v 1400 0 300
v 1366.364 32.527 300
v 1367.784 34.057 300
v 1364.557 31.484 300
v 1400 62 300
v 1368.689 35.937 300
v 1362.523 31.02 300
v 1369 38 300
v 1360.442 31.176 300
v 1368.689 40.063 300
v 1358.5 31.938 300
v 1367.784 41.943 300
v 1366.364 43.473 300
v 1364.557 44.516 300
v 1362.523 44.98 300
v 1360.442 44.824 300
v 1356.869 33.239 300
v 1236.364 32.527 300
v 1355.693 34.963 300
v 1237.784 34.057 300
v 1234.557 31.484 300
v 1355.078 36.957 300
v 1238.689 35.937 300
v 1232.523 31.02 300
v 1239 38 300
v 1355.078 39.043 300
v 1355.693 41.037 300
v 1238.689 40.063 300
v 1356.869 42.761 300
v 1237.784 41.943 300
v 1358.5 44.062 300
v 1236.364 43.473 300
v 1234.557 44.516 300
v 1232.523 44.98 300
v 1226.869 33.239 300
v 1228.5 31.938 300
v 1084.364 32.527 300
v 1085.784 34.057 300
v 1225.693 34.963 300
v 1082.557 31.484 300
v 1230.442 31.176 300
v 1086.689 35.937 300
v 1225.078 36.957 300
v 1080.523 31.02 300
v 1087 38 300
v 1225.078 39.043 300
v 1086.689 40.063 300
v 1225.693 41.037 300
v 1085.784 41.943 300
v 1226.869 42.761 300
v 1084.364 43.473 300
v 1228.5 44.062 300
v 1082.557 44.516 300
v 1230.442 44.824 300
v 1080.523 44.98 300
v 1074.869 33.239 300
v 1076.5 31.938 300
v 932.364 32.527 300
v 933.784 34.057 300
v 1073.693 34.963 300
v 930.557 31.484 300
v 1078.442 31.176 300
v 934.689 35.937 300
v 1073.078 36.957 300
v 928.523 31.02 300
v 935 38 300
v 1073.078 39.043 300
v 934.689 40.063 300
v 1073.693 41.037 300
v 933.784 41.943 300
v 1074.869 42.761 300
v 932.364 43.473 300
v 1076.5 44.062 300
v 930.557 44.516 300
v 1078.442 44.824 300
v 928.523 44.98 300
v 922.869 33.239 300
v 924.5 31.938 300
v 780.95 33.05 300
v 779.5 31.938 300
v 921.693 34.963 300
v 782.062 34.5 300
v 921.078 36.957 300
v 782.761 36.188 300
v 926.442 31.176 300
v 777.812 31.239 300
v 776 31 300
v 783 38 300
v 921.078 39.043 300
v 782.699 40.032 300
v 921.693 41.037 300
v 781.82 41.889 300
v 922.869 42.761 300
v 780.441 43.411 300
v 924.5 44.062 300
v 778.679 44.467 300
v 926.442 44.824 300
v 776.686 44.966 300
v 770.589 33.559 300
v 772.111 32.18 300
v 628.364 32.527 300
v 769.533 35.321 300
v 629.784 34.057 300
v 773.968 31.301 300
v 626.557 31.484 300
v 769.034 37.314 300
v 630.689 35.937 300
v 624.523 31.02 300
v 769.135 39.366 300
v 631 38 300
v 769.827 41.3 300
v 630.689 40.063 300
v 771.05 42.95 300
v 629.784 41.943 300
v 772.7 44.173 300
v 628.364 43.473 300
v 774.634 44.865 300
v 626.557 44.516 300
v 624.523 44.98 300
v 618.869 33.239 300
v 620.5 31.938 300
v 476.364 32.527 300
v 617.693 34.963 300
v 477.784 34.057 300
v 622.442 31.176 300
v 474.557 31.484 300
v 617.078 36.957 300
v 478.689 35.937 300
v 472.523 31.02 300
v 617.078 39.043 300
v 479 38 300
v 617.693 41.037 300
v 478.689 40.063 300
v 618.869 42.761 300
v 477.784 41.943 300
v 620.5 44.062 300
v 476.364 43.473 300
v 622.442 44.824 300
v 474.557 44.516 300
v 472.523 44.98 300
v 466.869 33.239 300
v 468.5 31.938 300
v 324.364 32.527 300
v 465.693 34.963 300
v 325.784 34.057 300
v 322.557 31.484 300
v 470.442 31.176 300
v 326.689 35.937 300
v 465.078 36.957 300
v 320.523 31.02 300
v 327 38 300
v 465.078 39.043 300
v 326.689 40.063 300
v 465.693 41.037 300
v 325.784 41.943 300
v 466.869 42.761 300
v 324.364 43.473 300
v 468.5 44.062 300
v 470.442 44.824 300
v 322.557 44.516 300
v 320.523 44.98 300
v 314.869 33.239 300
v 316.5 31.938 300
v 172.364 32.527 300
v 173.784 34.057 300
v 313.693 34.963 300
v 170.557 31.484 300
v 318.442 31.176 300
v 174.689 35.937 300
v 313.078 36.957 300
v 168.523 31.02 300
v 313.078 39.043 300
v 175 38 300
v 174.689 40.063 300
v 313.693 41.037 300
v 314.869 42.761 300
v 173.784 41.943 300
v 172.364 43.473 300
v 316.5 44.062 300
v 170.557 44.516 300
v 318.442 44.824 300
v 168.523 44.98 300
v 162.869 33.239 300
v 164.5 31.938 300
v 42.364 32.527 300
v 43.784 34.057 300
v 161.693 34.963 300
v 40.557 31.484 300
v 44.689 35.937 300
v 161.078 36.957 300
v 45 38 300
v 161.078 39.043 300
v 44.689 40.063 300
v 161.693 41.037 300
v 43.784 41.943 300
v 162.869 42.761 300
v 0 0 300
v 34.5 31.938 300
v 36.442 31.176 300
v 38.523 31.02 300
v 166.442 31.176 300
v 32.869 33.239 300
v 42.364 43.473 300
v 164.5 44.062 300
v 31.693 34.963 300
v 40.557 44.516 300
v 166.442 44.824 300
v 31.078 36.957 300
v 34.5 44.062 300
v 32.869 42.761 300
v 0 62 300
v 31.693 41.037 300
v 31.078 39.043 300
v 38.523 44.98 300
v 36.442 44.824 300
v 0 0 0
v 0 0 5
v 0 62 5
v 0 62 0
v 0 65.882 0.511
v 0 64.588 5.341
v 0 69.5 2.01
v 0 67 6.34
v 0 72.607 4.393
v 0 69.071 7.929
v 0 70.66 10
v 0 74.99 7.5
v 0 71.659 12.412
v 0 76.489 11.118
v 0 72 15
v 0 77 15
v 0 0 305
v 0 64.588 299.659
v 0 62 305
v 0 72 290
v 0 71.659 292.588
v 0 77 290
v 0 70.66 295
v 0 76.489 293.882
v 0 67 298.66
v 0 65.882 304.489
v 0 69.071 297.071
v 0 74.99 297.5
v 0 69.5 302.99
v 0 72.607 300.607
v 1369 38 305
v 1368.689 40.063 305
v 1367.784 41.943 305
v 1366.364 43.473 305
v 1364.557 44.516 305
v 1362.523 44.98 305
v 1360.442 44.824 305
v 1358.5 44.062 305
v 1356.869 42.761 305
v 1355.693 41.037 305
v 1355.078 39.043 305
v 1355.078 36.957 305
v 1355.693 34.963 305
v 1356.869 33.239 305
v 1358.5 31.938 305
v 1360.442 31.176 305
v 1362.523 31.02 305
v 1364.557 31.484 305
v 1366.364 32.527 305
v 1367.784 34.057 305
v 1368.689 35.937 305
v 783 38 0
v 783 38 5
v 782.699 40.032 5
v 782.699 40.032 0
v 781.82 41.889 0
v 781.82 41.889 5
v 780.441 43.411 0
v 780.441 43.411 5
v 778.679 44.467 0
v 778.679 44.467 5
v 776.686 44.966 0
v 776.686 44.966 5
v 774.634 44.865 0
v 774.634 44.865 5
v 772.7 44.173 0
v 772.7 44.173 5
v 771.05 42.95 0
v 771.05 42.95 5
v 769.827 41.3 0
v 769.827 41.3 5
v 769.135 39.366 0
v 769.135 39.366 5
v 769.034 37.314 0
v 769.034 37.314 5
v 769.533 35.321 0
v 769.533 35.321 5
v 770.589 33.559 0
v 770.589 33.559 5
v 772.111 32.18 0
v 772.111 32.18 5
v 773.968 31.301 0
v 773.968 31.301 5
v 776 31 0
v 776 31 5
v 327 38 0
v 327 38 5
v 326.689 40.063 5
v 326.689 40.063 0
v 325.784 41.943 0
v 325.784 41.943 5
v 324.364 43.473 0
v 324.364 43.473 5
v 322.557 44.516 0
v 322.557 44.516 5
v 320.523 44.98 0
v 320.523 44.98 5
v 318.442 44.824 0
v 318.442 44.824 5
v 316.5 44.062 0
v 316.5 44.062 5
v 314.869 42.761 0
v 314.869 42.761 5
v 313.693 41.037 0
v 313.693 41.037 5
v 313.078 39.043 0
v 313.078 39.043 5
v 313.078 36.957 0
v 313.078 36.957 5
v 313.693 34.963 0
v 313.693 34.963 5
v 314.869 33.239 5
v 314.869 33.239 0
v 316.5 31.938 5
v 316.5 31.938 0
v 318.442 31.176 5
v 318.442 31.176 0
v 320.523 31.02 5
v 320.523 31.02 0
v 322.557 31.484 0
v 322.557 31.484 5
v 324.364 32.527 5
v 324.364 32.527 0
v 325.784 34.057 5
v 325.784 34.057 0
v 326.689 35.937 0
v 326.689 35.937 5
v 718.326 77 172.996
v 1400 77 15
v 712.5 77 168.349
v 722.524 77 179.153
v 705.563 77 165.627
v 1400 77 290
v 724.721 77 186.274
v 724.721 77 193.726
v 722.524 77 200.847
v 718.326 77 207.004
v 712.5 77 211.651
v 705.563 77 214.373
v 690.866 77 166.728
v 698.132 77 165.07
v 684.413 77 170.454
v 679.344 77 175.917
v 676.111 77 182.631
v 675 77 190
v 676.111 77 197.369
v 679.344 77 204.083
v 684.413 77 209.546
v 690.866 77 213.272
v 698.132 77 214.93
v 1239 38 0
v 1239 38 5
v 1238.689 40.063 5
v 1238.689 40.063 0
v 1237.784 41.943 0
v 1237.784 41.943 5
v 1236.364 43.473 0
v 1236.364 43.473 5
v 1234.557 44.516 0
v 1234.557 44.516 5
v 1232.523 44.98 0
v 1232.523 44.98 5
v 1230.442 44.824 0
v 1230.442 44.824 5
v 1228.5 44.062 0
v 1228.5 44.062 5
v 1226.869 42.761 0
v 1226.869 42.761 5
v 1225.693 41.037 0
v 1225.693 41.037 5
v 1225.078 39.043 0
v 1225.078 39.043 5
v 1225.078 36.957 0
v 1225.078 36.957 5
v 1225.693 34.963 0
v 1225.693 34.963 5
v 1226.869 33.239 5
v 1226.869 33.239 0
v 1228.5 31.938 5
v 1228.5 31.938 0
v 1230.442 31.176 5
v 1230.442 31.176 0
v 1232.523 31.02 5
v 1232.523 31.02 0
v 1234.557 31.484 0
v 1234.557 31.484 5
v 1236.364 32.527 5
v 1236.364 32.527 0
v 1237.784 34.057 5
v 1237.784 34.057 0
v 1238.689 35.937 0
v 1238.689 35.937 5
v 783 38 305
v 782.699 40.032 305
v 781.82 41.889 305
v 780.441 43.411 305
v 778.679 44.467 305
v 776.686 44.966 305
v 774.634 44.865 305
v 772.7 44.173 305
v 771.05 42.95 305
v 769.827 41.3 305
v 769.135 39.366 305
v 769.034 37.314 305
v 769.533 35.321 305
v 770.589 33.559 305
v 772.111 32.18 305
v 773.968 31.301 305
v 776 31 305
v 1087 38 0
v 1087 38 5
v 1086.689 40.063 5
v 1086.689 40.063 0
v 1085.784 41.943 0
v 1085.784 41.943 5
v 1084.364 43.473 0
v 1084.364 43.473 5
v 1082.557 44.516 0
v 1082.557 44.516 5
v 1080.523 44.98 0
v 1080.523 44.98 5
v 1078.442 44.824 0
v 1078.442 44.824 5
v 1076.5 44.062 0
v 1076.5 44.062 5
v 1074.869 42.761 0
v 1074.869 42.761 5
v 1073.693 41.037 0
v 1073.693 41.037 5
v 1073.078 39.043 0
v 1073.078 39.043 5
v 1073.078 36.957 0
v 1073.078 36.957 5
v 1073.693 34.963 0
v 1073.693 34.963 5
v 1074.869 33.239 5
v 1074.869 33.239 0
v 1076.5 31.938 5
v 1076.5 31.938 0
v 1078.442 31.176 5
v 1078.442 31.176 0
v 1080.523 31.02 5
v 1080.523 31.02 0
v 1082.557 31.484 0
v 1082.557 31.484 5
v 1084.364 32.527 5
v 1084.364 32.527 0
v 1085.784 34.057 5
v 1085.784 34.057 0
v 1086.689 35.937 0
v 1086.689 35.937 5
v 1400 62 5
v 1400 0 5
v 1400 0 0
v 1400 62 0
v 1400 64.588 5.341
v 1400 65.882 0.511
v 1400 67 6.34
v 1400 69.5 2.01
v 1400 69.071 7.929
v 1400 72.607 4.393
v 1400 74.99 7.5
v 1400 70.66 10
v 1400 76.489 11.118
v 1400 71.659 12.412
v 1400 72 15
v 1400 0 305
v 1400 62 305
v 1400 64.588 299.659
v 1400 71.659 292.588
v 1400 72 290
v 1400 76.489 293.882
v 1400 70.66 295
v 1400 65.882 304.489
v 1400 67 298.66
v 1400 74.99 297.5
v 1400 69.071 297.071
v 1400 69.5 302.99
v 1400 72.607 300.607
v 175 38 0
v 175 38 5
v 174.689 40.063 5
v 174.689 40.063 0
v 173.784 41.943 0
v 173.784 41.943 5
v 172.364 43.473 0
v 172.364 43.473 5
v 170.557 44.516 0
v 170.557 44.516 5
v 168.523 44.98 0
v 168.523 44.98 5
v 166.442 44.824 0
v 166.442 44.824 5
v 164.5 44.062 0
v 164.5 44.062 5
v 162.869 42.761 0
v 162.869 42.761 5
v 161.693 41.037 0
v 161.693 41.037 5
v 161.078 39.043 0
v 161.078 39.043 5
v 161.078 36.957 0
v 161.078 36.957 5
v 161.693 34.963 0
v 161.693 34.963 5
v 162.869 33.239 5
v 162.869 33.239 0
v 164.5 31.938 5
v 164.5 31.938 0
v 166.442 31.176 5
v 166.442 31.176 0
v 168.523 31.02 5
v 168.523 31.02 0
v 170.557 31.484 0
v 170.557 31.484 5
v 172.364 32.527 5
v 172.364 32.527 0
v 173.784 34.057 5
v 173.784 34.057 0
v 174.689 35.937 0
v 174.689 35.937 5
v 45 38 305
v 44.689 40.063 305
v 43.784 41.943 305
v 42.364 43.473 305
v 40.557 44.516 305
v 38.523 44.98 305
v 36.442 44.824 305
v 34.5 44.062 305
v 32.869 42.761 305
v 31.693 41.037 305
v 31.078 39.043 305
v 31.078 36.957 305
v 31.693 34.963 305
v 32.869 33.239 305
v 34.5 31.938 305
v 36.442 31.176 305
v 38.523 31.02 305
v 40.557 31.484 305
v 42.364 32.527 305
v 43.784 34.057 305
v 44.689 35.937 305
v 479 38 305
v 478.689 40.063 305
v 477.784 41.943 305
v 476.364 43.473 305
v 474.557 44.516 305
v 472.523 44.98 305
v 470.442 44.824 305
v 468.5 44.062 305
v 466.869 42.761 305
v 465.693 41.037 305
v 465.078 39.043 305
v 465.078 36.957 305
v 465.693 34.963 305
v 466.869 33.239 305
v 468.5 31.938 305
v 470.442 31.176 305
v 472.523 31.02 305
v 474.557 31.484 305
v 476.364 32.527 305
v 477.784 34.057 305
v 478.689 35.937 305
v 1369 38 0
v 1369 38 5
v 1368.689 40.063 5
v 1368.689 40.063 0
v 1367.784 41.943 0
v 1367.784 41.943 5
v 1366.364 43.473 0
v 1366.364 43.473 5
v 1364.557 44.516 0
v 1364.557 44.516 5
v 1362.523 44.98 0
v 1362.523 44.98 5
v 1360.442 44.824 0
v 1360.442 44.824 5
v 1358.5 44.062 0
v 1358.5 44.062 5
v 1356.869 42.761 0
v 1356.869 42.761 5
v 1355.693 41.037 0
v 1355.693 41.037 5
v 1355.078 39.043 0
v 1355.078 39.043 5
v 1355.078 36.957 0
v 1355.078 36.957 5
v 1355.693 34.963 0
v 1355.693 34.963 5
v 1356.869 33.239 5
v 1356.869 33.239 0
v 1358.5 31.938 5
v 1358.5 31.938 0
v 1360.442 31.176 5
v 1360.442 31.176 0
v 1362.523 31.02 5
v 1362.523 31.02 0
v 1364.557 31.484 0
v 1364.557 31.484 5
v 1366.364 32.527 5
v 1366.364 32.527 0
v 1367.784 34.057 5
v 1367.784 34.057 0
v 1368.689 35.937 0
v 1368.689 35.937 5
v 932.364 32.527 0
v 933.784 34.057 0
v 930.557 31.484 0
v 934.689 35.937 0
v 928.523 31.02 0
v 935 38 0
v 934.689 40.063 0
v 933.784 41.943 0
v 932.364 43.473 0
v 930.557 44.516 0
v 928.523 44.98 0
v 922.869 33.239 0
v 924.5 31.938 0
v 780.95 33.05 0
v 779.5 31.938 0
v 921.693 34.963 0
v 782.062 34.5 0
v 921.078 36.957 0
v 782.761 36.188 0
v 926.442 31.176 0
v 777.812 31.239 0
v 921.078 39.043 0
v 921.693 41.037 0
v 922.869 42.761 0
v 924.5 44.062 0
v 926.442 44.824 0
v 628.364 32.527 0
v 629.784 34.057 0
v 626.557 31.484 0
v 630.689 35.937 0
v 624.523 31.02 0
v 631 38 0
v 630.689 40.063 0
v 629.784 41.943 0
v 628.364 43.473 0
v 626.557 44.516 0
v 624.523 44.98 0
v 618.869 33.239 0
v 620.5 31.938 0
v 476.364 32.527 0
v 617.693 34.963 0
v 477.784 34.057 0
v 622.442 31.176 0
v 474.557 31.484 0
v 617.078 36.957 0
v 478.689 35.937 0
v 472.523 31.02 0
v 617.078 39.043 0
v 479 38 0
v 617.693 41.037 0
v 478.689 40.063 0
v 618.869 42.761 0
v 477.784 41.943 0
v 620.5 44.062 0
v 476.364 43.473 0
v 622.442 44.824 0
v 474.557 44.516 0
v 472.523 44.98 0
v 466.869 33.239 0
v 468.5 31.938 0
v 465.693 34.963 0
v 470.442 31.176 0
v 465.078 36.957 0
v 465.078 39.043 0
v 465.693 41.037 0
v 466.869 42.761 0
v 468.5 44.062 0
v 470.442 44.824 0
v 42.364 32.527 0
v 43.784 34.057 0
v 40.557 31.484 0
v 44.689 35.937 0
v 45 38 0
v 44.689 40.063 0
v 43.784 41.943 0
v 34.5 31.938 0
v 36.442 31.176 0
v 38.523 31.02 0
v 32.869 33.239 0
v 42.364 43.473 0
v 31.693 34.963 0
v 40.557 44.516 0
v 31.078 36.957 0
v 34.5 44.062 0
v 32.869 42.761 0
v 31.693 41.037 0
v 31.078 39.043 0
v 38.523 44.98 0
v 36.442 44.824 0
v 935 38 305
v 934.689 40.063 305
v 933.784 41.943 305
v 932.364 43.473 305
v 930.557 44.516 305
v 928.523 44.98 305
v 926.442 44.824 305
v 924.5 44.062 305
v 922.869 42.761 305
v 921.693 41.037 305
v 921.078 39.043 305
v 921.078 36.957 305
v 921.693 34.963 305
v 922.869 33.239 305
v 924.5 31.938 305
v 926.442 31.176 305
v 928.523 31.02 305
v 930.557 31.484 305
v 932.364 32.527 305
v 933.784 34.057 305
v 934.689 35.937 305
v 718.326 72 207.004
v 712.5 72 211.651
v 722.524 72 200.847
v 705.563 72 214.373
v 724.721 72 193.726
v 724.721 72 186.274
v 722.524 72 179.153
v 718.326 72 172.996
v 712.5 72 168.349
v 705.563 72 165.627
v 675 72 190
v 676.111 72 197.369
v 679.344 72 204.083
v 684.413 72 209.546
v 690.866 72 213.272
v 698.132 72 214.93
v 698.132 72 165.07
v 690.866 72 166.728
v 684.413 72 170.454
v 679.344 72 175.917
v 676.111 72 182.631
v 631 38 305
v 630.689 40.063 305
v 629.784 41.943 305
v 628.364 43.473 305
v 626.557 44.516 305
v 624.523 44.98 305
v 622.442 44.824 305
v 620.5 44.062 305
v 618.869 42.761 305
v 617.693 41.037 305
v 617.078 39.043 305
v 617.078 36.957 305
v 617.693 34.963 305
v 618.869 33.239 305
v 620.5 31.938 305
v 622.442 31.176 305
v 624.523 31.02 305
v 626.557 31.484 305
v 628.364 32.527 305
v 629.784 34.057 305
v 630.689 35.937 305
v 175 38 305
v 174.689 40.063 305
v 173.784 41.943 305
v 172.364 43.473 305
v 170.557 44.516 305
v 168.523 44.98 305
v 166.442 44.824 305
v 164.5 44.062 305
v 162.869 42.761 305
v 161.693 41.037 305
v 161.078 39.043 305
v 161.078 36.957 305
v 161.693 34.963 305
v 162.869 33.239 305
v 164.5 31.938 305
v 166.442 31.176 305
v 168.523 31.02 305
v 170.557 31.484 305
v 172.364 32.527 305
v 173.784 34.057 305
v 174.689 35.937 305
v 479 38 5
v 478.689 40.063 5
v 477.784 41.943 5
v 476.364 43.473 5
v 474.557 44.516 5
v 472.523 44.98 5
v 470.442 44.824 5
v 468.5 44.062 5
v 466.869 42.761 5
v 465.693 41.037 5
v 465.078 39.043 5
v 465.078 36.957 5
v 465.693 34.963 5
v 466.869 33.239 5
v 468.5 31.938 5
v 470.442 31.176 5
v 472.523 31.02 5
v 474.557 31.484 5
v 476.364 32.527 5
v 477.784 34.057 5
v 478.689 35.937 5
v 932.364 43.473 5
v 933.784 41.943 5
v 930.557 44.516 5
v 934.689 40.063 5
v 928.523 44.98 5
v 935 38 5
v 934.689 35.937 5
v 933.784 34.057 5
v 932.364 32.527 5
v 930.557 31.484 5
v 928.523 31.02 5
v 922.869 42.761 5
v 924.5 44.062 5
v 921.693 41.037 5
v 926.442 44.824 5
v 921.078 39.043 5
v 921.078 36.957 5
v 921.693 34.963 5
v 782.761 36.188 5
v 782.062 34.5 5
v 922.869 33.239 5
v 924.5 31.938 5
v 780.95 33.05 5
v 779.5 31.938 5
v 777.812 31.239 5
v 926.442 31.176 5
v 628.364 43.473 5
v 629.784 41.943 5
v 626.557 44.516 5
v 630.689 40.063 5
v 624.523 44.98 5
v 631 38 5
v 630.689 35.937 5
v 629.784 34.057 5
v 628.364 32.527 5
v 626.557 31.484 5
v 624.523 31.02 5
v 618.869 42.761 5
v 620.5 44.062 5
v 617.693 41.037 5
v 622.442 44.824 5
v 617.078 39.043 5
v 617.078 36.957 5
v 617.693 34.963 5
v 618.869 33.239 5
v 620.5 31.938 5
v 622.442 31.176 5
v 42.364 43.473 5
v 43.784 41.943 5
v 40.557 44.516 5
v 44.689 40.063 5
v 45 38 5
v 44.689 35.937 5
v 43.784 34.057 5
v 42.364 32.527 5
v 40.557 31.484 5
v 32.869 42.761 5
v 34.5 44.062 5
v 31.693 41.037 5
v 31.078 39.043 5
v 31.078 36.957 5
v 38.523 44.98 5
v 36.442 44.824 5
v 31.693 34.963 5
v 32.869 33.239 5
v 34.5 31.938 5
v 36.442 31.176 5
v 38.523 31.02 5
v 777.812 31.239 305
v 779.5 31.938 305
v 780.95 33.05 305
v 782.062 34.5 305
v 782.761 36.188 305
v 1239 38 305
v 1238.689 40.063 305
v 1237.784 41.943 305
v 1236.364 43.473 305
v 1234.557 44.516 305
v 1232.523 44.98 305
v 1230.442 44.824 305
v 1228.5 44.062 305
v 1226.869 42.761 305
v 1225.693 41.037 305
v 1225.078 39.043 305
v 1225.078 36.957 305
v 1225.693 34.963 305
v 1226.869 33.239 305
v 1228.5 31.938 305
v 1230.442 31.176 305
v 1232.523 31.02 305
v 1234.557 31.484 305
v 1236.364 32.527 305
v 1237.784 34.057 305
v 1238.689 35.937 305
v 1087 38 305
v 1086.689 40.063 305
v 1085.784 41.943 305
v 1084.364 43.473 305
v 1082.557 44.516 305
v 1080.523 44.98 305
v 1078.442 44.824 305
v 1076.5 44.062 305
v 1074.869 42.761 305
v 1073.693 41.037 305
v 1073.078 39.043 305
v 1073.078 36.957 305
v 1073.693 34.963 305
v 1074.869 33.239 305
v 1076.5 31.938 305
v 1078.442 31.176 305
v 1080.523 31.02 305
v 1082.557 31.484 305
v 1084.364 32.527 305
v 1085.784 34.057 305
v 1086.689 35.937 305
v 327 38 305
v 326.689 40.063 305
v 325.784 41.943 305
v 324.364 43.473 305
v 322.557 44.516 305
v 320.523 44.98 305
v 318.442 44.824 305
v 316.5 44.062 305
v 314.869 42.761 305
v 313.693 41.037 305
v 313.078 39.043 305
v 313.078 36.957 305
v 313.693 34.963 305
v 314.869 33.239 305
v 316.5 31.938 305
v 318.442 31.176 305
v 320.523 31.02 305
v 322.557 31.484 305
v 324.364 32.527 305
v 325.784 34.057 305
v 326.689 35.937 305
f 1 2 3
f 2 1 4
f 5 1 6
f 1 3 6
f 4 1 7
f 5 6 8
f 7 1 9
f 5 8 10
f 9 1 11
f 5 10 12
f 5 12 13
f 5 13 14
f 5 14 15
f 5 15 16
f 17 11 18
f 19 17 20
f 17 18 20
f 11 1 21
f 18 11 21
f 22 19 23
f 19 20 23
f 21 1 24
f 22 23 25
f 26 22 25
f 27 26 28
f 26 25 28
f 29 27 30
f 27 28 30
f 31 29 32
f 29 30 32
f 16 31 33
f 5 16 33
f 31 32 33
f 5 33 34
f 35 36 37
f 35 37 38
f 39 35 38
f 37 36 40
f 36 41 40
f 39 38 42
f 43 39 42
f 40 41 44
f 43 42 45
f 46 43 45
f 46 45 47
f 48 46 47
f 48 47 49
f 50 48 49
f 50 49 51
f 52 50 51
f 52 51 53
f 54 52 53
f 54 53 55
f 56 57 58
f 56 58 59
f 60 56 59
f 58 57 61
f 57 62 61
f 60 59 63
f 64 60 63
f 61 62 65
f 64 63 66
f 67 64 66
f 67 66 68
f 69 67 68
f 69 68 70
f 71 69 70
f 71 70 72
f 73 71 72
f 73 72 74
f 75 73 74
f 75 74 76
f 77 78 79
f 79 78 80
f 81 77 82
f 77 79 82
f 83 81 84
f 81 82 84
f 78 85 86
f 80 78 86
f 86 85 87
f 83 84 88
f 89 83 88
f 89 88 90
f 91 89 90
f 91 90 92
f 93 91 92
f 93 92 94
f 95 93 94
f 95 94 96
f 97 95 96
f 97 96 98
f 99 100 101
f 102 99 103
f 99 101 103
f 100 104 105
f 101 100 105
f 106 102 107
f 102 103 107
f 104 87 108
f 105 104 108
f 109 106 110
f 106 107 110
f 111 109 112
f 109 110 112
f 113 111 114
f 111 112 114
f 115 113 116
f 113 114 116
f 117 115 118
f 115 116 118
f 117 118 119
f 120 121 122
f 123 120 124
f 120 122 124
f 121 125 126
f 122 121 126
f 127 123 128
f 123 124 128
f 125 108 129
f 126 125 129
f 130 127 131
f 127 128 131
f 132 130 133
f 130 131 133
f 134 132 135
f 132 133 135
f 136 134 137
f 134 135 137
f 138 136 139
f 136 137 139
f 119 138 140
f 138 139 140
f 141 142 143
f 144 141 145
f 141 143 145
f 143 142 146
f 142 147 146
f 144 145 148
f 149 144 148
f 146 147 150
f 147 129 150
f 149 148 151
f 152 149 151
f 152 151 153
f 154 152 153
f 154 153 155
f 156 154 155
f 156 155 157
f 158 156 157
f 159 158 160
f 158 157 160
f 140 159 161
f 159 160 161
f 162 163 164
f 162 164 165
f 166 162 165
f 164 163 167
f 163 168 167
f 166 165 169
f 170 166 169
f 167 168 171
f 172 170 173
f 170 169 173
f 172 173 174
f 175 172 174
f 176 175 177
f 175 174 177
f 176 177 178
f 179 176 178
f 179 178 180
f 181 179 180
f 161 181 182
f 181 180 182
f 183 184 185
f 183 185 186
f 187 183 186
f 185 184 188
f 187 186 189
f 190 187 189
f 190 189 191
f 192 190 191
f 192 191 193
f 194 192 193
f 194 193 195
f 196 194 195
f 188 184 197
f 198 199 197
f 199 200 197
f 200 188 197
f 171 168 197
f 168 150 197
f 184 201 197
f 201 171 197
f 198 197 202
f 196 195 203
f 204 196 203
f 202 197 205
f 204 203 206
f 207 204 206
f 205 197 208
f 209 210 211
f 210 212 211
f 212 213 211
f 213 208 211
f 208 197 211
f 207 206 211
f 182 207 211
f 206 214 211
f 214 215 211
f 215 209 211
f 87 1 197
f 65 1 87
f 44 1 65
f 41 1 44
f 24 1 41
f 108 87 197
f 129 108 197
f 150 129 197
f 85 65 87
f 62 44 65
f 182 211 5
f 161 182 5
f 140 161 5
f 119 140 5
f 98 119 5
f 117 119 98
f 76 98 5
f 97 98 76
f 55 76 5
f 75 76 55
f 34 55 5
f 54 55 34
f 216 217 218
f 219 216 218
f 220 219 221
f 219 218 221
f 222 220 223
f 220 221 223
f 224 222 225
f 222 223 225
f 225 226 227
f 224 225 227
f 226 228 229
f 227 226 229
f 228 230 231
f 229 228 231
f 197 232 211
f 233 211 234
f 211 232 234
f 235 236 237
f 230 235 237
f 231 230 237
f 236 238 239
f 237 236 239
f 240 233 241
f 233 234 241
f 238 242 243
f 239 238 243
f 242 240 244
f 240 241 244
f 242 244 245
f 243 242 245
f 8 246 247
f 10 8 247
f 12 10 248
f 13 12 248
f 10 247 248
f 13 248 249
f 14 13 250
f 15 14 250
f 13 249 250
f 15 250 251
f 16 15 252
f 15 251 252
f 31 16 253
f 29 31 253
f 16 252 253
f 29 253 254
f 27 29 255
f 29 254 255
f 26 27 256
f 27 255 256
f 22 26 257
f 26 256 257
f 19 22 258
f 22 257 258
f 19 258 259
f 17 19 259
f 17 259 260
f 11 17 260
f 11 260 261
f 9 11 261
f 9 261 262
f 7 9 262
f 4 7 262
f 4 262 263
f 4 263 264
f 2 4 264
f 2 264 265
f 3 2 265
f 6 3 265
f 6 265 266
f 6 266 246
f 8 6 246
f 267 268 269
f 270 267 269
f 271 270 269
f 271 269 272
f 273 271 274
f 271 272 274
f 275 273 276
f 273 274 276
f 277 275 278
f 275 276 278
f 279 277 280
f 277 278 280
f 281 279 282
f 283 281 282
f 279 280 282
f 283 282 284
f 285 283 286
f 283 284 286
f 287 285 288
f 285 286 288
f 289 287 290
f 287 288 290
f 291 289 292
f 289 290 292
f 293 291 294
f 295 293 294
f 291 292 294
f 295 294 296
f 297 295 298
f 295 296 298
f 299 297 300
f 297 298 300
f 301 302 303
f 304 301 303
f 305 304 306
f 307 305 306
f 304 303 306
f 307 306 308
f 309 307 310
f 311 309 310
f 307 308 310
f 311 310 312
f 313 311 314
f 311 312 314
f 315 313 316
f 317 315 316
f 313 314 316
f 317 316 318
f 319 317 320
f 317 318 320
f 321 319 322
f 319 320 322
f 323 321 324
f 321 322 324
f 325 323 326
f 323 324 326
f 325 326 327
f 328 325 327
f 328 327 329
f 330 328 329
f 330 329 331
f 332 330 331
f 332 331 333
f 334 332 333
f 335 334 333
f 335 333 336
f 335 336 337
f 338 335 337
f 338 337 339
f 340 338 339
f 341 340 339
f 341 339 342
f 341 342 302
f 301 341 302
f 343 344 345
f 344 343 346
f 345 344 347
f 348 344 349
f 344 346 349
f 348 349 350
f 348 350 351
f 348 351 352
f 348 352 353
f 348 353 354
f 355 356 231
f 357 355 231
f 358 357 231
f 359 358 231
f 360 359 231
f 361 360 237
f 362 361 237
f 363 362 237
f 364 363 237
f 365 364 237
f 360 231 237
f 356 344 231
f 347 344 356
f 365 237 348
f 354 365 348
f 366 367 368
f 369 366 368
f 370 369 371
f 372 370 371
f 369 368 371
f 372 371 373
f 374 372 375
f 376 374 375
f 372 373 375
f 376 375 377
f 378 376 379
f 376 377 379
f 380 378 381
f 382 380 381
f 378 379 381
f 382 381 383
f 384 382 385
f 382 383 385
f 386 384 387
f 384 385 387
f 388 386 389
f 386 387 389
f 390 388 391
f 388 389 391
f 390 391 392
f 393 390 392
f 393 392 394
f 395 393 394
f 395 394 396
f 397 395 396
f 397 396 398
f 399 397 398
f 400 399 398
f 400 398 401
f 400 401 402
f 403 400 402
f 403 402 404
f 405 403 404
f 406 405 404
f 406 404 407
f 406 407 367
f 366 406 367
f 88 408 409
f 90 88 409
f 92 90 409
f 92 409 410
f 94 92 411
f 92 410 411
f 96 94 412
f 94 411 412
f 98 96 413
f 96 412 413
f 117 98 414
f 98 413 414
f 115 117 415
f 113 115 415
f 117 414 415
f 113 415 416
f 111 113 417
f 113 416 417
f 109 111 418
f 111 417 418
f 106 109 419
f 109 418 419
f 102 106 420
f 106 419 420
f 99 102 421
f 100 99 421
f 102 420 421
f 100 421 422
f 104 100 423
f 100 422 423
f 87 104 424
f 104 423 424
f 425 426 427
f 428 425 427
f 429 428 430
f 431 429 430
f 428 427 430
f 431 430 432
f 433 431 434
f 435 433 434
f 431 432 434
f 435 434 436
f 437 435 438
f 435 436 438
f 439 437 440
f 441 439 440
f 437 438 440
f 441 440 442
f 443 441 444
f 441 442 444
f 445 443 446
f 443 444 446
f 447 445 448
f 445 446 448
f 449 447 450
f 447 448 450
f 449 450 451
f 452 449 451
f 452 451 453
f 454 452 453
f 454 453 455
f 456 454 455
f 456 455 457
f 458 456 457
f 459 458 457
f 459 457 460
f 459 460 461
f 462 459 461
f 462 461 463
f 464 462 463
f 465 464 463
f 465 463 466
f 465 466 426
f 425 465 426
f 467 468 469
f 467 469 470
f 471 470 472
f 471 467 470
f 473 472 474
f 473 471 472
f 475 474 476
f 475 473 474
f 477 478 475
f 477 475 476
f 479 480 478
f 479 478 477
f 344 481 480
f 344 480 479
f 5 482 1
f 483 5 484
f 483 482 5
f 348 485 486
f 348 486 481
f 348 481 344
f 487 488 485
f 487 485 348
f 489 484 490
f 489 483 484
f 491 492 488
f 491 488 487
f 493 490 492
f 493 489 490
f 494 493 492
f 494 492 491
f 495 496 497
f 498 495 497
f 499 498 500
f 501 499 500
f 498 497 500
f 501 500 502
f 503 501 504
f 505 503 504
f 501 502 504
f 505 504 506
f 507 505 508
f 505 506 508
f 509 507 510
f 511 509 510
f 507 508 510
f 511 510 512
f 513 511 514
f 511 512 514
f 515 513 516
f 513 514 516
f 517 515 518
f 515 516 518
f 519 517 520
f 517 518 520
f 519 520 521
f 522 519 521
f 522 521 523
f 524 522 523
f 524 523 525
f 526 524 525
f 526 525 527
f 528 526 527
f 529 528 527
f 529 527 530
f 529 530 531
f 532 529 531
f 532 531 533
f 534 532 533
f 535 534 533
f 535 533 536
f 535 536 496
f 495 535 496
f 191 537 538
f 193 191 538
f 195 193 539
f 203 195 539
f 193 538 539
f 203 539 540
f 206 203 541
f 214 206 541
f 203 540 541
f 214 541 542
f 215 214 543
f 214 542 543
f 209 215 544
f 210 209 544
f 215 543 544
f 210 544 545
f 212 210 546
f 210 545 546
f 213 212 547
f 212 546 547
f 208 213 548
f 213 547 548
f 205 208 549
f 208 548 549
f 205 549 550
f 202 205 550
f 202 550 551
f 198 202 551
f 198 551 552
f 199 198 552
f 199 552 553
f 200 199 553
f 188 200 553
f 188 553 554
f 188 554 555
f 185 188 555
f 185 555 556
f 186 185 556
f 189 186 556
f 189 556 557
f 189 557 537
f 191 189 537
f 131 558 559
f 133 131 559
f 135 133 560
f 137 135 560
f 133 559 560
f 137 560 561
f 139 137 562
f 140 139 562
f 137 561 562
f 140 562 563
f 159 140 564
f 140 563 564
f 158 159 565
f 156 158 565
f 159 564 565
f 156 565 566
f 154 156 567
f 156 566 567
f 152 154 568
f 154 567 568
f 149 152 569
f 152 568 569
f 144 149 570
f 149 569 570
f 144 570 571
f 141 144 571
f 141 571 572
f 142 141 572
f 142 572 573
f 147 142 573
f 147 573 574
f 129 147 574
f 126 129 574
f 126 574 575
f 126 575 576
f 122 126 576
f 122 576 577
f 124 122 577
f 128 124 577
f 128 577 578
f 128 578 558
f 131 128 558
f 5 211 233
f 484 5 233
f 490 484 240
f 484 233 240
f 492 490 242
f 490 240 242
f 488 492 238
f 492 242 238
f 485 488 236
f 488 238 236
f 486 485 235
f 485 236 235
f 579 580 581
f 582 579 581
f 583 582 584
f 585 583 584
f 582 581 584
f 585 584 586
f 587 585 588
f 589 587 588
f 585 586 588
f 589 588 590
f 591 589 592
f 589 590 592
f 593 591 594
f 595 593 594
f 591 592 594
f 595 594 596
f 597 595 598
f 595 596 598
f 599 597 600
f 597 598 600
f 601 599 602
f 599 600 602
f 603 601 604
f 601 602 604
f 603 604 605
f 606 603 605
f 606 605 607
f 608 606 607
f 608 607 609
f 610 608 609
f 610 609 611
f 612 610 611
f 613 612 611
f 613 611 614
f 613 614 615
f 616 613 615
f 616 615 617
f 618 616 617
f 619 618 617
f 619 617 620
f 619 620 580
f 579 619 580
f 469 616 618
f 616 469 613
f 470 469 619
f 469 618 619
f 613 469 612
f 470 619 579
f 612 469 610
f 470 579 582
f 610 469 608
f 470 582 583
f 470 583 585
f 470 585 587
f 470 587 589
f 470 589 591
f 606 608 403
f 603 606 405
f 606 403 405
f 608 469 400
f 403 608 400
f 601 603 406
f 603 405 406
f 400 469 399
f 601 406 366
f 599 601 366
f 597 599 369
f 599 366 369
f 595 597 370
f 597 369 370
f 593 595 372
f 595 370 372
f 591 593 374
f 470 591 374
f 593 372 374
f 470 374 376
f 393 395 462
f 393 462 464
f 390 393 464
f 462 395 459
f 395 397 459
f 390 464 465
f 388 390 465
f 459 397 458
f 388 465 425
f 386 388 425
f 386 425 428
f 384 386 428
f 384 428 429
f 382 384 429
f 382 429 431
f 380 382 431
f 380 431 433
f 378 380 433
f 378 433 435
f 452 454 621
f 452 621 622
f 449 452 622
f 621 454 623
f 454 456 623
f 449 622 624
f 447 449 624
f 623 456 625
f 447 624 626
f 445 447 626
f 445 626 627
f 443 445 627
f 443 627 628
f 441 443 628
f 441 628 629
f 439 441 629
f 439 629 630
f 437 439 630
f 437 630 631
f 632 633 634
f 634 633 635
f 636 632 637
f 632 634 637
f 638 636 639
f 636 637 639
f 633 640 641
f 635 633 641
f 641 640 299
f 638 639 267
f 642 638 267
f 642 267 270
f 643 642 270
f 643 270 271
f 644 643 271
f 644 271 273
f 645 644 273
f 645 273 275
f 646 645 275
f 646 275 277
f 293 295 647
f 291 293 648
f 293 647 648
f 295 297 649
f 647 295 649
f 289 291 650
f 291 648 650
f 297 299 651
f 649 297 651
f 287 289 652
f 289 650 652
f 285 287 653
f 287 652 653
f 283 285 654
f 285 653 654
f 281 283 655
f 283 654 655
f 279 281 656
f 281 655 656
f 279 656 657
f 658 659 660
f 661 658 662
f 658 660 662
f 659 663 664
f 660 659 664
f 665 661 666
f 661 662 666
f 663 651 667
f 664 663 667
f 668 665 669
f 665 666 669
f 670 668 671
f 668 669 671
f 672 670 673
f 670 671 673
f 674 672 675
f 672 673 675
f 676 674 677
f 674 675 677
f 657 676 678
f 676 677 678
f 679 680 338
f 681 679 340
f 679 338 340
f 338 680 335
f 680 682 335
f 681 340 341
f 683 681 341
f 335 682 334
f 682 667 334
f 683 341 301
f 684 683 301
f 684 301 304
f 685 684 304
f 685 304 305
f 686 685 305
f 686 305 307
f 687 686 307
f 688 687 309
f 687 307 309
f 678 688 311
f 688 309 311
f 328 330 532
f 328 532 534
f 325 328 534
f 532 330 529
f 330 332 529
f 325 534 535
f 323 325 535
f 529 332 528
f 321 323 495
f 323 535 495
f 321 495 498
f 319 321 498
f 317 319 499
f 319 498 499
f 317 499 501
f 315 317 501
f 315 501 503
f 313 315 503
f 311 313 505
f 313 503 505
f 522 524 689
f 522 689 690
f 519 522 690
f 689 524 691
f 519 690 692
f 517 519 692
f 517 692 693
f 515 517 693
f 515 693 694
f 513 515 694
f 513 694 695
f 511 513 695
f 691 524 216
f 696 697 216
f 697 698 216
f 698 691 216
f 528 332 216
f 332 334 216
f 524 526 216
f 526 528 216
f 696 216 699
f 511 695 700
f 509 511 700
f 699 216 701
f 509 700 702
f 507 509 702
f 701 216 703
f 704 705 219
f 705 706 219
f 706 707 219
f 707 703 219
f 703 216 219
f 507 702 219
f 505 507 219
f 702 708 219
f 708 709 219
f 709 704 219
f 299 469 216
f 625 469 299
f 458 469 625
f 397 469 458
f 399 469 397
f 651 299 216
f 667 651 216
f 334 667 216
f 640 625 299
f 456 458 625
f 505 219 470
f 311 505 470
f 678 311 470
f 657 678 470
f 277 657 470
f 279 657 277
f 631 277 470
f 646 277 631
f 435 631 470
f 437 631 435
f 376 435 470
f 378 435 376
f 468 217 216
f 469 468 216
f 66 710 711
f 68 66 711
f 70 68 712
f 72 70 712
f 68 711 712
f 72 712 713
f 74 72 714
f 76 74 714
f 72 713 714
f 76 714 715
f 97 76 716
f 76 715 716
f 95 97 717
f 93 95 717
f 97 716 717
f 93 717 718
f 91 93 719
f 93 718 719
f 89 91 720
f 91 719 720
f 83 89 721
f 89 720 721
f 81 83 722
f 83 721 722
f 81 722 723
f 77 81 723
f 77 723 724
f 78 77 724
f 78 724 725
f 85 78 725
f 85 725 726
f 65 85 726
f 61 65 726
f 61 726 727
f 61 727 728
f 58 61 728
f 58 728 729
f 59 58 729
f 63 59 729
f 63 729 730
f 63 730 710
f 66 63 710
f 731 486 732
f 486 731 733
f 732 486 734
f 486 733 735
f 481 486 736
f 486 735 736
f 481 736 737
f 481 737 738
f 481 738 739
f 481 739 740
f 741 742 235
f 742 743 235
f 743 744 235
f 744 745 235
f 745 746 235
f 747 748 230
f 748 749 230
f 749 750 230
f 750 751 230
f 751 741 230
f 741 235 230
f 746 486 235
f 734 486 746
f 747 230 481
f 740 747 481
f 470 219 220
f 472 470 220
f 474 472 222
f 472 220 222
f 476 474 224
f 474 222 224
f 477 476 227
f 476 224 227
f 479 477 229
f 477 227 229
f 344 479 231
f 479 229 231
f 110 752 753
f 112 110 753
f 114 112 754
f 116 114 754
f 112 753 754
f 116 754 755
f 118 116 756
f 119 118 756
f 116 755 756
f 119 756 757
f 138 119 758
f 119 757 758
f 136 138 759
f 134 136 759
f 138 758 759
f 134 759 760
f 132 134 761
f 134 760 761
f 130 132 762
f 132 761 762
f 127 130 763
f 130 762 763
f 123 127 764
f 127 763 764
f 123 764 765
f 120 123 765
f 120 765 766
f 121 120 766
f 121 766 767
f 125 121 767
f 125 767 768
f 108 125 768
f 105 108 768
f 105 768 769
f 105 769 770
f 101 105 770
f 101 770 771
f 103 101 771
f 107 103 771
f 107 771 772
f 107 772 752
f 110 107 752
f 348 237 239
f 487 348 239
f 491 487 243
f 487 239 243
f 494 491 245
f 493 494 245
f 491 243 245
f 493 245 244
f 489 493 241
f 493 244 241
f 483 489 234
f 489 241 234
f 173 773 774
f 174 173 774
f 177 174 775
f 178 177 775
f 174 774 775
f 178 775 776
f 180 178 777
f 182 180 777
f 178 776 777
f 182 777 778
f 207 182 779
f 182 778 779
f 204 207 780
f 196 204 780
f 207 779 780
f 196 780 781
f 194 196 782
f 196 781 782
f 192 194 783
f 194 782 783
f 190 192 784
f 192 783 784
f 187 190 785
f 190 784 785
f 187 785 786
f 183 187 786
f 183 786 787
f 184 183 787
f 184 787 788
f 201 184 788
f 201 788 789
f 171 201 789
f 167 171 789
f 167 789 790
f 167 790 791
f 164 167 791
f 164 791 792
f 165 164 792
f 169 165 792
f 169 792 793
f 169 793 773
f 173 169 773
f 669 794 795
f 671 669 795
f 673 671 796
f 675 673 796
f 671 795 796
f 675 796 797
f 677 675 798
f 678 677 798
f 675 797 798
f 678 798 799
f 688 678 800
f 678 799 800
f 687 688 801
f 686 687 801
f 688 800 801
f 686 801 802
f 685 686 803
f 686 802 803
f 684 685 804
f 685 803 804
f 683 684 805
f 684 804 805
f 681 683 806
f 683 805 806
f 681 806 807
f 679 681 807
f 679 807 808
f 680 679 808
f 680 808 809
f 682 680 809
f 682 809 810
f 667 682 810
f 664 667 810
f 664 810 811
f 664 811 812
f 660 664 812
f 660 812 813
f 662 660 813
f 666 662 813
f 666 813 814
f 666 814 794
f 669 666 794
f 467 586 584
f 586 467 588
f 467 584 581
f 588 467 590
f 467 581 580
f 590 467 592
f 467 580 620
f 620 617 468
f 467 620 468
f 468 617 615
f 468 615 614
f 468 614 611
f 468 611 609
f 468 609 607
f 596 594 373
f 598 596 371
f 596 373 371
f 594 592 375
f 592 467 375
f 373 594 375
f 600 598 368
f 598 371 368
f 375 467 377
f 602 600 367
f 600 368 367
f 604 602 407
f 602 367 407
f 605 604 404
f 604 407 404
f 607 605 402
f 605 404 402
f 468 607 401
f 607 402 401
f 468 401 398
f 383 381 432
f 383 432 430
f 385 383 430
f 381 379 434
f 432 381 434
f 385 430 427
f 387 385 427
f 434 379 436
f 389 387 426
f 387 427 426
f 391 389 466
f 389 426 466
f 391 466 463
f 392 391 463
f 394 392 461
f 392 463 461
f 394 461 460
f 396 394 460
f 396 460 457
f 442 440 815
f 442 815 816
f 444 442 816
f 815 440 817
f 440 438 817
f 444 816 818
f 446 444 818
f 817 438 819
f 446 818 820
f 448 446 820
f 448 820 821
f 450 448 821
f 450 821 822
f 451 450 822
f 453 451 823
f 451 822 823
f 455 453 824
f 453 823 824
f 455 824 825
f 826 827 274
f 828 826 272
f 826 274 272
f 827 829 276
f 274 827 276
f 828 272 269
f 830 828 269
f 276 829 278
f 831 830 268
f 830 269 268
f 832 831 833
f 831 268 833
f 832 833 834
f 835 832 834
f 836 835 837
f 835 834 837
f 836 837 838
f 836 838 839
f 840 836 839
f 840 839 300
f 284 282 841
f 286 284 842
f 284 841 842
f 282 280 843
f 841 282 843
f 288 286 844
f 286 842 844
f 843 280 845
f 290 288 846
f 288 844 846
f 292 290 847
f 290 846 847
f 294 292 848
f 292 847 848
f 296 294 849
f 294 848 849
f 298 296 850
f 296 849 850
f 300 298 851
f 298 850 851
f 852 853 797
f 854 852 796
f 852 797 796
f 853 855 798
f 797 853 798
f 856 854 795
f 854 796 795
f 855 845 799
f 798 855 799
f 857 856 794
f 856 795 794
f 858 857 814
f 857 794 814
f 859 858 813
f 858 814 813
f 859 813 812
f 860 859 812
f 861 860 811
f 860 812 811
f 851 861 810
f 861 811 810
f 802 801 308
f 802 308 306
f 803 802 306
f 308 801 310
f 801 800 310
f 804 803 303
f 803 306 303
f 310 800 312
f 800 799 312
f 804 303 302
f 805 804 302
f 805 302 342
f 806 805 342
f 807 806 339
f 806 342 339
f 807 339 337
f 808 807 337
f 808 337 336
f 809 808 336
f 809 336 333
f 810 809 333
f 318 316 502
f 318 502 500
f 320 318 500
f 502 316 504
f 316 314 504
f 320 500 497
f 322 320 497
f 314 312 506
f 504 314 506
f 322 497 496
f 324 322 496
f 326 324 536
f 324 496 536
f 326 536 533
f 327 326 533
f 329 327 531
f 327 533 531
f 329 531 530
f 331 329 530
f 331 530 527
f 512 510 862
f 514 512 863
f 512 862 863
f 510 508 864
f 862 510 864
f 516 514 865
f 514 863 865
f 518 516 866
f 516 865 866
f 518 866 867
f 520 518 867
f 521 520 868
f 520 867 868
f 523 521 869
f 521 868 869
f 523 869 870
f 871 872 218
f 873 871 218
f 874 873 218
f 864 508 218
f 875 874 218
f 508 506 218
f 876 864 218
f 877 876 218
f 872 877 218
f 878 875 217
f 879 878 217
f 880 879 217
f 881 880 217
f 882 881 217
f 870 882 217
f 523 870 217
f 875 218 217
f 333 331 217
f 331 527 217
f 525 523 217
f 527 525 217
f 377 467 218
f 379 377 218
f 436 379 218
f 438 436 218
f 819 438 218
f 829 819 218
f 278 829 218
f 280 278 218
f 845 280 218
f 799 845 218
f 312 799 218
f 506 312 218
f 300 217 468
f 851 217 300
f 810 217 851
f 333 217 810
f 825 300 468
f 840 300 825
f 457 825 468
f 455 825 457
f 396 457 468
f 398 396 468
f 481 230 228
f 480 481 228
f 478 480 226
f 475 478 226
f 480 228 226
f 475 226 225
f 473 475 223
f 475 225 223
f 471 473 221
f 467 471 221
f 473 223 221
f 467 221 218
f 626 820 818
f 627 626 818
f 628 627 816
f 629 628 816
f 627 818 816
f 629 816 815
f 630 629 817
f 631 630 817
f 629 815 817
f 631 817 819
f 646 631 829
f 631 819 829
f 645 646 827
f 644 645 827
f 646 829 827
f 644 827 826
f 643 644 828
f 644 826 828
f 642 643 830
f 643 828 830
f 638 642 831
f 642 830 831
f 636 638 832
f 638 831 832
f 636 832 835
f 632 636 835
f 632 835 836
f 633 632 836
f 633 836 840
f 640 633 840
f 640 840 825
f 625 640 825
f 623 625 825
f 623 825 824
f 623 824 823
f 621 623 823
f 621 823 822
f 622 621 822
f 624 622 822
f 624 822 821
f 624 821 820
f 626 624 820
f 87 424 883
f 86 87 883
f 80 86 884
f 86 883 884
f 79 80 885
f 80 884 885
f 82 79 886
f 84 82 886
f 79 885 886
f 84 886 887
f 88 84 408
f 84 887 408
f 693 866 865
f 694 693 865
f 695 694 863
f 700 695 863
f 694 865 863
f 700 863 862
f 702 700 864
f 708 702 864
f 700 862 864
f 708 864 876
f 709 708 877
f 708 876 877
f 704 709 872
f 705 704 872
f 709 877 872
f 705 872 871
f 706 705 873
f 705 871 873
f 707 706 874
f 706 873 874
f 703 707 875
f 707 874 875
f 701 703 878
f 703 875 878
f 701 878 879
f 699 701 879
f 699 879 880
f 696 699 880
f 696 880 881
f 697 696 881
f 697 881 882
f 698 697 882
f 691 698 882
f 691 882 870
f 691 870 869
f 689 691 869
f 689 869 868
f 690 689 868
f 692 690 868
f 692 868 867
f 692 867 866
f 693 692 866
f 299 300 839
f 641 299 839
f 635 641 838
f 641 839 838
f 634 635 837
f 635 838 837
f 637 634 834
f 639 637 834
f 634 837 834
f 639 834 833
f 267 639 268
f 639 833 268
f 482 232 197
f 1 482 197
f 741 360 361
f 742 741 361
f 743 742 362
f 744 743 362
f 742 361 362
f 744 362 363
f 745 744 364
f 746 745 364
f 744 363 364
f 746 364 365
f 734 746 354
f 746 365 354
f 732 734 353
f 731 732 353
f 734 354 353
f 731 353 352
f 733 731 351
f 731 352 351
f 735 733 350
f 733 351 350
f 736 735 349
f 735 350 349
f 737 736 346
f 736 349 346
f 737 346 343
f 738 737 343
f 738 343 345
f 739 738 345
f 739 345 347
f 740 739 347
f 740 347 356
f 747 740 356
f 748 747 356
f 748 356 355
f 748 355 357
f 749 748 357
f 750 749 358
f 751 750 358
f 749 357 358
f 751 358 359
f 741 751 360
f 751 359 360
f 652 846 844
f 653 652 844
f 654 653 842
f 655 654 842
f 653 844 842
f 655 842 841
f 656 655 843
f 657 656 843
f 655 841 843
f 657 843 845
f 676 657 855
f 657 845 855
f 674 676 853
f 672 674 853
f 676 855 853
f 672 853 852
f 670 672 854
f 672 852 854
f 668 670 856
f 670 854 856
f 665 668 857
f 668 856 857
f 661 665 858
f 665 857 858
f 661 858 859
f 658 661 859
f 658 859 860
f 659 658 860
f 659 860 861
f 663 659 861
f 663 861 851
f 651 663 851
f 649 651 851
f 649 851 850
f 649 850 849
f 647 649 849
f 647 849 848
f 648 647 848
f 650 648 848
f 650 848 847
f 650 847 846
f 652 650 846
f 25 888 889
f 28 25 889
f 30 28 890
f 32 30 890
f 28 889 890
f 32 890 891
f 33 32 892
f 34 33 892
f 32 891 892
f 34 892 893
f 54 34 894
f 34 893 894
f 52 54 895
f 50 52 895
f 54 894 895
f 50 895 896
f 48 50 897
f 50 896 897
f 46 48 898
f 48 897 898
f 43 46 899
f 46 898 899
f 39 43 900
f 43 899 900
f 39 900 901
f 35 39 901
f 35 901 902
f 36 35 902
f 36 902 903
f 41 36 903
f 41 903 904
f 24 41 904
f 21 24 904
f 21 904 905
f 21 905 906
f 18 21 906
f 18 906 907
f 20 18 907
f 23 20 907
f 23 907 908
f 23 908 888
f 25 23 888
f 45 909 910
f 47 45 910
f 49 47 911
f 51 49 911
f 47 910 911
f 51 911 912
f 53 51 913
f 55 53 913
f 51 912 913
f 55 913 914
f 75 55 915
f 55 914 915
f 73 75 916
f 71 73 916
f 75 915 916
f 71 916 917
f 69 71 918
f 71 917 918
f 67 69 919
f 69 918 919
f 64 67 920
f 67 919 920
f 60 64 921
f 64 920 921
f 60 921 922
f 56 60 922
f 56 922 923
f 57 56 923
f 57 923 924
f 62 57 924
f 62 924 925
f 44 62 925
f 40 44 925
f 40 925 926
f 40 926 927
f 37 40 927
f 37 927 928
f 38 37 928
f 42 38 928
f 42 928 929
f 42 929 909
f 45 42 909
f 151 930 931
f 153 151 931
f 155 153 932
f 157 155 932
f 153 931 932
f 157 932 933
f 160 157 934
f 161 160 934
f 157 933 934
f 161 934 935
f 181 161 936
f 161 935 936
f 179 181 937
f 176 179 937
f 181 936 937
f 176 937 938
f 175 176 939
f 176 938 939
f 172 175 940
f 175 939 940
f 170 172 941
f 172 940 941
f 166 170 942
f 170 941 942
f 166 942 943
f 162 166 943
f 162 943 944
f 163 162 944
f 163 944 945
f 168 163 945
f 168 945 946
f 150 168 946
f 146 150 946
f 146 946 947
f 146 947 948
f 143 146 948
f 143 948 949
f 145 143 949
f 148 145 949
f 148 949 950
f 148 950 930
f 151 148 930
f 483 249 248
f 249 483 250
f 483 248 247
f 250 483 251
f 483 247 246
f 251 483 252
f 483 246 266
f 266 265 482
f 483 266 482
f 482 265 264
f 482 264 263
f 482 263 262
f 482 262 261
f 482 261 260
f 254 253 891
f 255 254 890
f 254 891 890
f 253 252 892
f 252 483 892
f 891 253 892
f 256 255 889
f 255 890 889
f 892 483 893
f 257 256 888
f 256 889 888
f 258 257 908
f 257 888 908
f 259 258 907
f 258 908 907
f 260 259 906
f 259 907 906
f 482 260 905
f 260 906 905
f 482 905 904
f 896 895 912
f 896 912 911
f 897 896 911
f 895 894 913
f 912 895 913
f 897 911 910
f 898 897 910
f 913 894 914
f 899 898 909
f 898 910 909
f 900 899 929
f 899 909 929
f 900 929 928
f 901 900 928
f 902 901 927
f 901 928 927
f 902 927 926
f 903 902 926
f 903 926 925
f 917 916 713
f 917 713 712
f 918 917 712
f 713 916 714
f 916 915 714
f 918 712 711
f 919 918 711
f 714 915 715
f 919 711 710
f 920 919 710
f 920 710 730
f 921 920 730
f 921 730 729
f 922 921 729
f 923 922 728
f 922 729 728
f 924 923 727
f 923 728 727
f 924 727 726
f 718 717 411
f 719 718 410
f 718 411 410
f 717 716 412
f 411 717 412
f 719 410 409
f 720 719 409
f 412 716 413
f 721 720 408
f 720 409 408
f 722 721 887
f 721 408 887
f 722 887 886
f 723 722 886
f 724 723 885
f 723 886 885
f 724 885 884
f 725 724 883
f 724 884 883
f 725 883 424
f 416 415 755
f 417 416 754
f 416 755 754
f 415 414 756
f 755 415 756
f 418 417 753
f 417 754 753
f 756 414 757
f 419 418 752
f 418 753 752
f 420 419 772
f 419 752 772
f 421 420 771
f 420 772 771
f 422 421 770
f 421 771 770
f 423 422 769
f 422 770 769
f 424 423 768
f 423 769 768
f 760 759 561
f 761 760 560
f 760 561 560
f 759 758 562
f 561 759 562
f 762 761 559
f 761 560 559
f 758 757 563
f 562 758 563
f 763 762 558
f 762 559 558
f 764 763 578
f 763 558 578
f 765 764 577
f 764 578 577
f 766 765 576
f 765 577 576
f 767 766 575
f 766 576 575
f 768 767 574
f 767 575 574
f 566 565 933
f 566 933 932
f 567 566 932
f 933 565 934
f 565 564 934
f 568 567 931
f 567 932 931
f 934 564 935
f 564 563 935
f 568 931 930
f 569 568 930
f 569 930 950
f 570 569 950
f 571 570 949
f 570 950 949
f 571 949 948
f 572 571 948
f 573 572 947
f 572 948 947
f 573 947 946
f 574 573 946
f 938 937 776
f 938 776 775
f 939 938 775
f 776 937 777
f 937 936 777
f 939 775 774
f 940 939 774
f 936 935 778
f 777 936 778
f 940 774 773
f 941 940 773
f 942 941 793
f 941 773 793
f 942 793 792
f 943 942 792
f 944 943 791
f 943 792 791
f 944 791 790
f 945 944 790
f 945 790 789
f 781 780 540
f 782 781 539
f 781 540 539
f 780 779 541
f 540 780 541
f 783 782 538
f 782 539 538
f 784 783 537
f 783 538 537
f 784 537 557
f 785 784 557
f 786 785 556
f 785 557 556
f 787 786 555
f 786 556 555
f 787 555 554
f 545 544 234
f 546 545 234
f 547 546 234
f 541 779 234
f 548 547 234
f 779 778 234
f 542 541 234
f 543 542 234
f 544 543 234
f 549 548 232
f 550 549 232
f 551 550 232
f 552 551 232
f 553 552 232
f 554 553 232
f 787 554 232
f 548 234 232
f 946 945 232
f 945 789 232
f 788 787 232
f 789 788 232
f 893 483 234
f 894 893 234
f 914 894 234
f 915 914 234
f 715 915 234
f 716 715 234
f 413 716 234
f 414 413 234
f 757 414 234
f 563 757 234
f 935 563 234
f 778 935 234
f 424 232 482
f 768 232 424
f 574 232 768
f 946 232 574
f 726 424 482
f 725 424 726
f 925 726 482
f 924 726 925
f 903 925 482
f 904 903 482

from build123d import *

# Parameters (mm, degrees)
F1_DEPTH = 1400
F2_R     = 25
F3_DEPTH = 5
F4_R     = 7
F5_DEPTH = 305.001
F6_DEPTH = 305.001


with BuildPart() as f1:
    # F0 (on Right) → F1 (new body)
    with BuildSketch(Plane.YZ):
        with BuildLine():
            Line((0, 5), (0, 0))
            Line((0, 0), (62, 0))
            ThreePointArc((62, 0), (72.606602, 4.393398), (77, 15))
            Line((77, 15), (77, 290))
            ThreePointArc((77, 290), (72.606602, 300.606602), (62, 305))
            Line((62, 305), (0, 305))
            Line((0, 305), (0, 300))
            Line((0, 300), (62, 300))
            ThreePointArc((62, 300), (69.071068, 297.071068), (72, 290))
            Line((72, 290), (72, 15))
            ThreePointArc((72, 15), (69.071068, 7.928932), (62, 5))
            Line((62, 5), (0, 5))
        make_face()
    extrude(amount=F1_DEPTH)

    # F2 (on face) → F3 (cut, through all)
    with BuildSketch(Plane(origin=(0, 77, 0), x_dir=(-1, 0, 0), z_dir=(0, 1, 0))):
        with Locations((-700, 190)):
            Circle(F2_R)
    extrude(amount=-F3_DEPTH, mode=Mode.SUBTRACT)

    # F4 (on face) → F5 (cut, through all)
    with BuildSketch(Plane.XY.offset(305)):
        with BuildLine():
            ThreePointArc((783, 38), (771.050253, 42.949747), (776, 31))
            ThreePointArc((776, 31), (780.949747, 33.050253), (783, 38))
        make_face()
        with Locations((928, 38)):
            Circle(F4_R)
        with Locations((1080, 38)):
            Circle(F4_R)
        with Locations((1232, 38)):
            Circle(F4_R)
        with Locations((1362, 38)):
            Circle(F4_R)
    extrude(amount=-F5_DEPTH, mode=Mode.SUBTRACT)

    # F4 (on face) → F6 (cut, through all)
    with BuildSketch(Plane.XY.offset(305)):
        with BuildLine():
            ThreePointArc((776, 31), (780.949747, 33.050253), (783, 38))
            ThreePointArc((783, 38), (771.050253, 42.949747), (776, 31))
        make_face()
        with Locations((928, 38)):
            Circle(F4_R)
        with Locations((1080, 38)):
            Circle(F4_R)
        with Locations((1232, 38)):
            Circle(F4_R)
        with Locations((1362, 38)):
            Circle(F4_R)
        with Locations((624, 38)):
            Circle(F4_R)
        with Locations((472, 38)):
            Circle(F4_R)
        with Locations((320, 38)):
            Circle(F4_R)
        with Locations((168, 38)):
            Circle(F4_R)
        with Locations((38, 38)):
            Circle(F4_R)
    extrude(amount=-F6_DEPTH, mode=Mode.SUBTRACT)


solid = f1.part
